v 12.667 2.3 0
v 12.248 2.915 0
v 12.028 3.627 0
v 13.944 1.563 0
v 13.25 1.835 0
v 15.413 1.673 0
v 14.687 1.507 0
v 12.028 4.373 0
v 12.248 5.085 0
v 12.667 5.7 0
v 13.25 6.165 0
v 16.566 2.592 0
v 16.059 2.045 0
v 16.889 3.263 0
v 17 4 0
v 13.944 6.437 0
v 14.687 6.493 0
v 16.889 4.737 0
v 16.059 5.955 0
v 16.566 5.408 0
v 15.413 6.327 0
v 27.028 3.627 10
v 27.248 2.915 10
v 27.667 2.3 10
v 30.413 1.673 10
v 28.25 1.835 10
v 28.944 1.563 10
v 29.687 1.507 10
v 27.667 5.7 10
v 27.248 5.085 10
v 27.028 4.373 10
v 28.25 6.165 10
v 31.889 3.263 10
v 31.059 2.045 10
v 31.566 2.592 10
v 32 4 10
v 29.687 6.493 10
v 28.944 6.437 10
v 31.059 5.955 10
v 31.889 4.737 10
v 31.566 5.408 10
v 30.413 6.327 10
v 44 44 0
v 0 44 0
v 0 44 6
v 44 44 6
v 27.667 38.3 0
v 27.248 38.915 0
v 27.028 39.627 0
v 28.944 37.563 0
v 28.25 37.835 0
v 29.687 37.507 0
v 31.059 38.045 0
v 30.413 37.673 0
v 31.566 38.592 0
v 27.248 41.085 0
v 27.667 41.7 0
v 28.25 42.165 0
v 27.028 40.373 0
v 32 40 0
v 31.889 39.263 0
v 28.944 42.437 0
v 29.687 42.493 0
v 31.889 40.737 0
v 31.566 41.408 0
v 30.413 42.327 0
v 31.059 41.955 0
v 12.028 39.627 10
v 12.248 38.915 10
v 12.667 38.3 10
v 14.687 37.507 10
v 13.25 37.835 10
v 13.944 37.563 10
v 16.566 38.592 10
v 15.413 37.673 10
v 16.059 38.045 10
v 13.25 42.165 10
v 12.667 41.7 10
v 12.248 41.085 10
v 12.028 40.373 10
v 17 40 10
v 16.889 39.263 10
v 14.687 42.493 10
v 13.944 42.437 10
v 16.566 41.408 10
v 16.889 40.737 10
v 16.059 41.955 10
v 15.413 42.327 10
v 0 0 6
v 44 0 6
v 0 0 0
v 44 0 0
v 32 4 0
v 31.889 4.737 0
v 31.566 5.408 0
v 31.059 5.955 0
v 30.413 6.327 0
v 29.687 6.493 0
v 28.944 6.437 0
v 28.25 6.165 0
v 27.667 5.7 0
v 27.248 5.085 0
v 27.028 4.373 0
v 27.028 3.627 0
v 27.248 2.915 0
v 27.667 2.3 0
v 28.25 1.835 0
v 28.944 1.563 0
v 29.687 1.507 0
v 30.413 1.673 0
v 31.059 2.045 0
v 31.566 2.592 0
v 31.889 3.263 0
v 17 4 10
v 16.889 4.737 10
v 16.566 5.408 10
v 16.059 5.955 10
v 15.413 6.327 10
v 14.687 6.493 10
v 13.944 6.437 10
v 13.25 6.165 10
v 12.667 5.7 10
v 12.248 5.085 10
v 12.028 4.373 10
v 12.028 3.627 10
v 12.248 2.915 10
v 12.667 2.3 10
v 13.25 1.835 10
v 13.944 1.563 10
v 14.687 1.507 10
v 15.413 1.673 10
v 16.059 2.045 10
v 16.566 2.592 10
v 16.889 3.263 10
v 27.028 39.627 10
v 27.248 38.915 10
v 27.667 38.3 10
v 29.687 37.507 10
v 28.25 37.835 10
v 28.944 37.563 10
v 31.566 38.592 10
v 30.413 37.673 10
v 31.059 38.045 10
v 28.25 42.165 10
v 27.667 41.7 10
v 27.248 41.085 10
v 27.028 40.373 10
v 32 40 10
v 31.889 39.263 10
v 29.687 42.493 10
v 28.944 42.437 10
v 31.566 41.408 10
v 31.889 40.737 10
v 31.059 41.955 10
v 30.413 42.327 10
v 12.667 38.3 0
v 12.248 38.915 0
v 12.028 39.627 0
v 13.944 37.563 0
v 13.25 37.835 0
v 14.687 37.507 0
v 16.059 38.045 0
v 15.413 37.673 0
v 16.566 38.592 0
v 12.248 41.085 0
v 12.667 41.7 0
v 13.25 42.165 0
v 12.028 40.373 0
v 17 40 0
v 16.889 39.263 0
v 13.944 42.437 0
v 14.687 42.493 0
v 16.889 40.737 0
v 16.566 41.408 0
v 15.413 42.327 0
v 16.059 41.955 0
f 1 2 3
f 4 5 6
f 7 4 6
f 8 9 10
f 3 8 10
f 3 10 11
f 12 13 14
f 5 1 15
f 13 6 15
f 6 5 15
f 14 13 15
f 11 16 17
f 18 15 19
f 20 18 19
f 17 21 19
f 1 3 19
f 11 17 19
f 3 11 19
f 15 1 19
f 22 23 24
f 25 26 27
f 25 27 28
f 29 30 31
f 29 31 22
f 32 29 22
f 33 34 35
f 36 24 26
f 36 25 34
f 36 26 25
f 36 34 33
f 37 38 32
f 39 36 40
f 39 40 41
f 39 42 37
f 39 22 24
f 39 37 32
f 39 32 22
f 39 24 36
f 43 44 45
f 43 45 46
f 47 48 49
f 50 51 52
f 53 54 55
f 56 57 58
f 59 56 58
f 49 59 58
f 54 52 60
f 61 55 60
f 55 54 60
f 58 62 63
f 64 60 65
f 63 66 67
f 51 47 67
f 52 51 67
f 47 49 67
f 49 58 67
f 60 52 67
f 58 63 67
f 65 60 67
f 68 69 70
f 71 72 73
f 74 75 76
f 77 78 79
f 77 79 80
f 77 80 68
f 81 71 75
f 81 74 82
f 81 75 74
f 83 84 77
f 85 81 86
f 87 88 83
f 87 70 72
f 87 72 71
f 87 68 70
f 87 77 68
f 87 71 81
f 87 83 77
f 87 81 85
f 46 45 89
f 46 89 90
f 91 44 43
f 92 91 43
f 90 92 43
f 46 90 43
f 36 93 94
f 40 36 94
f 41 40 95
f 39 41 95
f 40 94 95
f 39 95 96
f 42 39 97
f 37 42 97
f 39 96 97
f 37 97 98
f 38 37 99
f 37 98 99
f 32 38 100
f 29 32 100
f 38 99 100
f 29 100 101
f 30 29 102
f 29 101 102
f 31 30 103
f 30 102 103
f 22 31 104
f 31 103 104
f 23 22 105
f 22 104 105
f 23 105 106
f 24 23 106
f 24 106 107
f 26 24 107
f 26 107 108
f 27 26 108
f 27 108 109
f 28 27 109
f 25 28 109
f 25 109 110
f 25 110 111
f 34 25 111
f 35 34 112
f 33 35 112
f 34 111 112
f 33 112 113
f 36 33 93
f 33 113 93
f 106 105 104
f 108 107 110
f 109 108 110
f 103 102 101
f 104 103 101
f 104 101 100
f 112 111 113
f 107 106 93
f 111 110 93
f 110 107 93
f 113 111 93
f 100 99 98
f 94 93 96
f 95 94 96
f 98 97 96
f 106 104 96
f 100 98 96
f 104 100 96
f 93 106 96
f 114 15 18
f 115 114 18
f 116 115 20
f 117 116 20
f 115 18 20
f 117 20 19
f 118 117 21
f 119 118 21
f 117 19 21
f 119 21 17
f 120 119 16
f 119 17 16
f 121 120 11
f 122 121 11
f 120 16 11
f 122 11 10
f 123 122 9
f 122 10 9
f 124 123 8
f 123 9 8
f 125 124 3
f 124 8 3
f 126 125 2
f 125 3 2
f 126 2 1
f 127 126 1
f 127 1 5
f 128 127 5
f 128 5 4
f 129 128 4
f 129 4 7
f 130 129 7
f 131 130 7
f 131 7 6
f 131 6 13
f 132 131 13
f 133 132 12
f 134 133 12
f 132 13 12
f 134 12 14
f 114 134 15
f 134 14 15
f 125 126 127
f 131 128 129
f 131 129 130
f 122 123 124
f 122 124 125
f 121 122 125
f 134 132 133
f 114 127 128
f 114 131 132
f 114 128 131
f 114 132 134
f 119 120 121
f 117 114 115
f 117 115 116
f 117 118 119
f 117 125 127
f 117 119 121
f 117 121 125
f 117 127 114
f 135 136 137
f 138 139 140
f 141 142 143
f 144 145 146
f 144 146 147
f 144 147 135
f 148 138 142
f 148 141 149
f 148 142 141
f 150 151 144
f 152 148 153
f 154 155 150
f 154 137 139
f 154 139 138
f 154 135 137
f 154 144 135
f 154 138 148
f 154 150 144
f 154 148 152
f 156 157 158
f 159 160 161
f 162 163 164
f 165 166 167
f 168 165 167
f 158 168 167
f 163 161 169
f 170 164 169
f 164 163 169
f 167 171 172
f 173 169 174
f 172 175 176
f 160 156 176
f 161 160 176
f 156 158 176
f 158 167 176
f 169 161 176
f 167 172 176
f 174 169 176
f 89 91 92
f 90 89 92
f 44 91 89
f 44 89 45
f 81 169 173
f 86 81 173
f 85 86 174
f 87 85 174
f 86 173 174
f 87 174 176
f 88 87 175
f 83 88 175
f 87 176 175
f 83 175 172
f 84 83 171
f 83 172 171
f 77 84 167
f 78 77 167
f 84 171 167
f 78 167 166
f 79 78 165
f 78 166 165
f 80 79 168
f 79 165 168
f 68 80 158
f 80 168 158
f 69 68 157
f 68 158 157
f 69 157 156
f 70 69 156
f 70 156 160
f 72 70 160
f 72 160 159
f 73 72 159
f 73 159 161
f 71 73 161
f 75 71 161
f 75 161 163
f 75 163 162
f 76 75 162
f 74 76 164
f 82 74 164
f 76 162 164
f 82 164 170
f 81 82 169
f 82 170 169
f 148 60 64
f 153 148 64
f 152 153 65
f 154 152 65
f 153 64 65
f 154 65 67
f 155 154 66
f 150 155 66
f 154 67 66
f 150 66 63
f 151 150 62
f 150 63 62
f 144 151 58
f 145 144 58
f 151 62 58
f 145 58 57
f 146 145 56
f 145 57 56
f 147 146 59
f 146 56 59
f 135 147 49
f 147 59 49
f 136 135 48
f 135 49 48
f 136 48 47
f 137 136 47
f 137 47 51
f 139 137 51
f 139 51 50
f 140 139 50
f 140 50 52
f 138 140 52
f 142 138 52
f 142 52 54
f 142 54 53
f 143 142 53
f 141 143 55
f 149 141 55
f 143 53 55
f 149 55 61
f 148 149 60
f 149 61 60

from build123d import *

# Parameters (mm, degrees)
BOX_W             = 44
BOX_H             = 44
BOX_DEPTH         = 6
CYLINDER_R        = 2.5
CYLINDER_DEPTH    = 10
CYLINDER001_R     = 2.5
CYLINDER001_DEPTH = 10
CYLINDER002_R     = 2.5
CYLINDER002_DEPTH = 10
CYLINDER003_R     = 2.5
CYLINDER003_DEPTH = 10


with BuildPart() as cube:
    # Box → Box (new body)
    with BuildSketch(Plane.XY):
        with Locations((22, 22)):
            Rectangle(BOX_W, BOX_H)
    extrude(amount=BOX_DEPTH)


with BuildPart() as cylinder:
    # Cylinder → Cylinder (new body)
    with BuildSketch(Plane(origin=(14.5, 4, 0), x_dir=(1, 0, 0), z_dir=(0, 0, 1))):
        Circle(CYLINDER_R)
    extrude(amount=CYLINDER_DEPTH)


with BuildPart() as cylinder001:
    # Cylinder001 → Cylinder001 (new body)
    with BuildSketch(Plane(origin=(29.5, 4, 0), x_dir=(1, 0, 0), z_dir=(0, 0, 1))):
        Circle(CYLINDER001_R)
    extrude(amount=CYLINDER001_DEPTH)


with BuildPart() as cylinder002:
    # Cylinder002 → Cylinder002 (new body)
    with BuildSketch(Plane(origin=(14.5, 40, 0), x_dir=(1, 0, 0), z_dir=(0, 0, 1))):
        Circle(CYLINDER002_R)
    extrude(amount=CYLINDER002_DEPTH)


with BuildPart() as cylinder003:
    # Cylinder003 → Cylinder003 (new body)
    with BuildSketch(Plane(origin=(29.5, 40, 0), x_dir=(1, 0, 0), z_dir=(0, 0, 1))):
        Circle(CYLINDER003_R)
    extrude(amount=CYLINDER003_DEPTH)


solid = Compound([cube.part, cylinder.part, cylinder001.part, cylinder002.part, cylinder003.part])
